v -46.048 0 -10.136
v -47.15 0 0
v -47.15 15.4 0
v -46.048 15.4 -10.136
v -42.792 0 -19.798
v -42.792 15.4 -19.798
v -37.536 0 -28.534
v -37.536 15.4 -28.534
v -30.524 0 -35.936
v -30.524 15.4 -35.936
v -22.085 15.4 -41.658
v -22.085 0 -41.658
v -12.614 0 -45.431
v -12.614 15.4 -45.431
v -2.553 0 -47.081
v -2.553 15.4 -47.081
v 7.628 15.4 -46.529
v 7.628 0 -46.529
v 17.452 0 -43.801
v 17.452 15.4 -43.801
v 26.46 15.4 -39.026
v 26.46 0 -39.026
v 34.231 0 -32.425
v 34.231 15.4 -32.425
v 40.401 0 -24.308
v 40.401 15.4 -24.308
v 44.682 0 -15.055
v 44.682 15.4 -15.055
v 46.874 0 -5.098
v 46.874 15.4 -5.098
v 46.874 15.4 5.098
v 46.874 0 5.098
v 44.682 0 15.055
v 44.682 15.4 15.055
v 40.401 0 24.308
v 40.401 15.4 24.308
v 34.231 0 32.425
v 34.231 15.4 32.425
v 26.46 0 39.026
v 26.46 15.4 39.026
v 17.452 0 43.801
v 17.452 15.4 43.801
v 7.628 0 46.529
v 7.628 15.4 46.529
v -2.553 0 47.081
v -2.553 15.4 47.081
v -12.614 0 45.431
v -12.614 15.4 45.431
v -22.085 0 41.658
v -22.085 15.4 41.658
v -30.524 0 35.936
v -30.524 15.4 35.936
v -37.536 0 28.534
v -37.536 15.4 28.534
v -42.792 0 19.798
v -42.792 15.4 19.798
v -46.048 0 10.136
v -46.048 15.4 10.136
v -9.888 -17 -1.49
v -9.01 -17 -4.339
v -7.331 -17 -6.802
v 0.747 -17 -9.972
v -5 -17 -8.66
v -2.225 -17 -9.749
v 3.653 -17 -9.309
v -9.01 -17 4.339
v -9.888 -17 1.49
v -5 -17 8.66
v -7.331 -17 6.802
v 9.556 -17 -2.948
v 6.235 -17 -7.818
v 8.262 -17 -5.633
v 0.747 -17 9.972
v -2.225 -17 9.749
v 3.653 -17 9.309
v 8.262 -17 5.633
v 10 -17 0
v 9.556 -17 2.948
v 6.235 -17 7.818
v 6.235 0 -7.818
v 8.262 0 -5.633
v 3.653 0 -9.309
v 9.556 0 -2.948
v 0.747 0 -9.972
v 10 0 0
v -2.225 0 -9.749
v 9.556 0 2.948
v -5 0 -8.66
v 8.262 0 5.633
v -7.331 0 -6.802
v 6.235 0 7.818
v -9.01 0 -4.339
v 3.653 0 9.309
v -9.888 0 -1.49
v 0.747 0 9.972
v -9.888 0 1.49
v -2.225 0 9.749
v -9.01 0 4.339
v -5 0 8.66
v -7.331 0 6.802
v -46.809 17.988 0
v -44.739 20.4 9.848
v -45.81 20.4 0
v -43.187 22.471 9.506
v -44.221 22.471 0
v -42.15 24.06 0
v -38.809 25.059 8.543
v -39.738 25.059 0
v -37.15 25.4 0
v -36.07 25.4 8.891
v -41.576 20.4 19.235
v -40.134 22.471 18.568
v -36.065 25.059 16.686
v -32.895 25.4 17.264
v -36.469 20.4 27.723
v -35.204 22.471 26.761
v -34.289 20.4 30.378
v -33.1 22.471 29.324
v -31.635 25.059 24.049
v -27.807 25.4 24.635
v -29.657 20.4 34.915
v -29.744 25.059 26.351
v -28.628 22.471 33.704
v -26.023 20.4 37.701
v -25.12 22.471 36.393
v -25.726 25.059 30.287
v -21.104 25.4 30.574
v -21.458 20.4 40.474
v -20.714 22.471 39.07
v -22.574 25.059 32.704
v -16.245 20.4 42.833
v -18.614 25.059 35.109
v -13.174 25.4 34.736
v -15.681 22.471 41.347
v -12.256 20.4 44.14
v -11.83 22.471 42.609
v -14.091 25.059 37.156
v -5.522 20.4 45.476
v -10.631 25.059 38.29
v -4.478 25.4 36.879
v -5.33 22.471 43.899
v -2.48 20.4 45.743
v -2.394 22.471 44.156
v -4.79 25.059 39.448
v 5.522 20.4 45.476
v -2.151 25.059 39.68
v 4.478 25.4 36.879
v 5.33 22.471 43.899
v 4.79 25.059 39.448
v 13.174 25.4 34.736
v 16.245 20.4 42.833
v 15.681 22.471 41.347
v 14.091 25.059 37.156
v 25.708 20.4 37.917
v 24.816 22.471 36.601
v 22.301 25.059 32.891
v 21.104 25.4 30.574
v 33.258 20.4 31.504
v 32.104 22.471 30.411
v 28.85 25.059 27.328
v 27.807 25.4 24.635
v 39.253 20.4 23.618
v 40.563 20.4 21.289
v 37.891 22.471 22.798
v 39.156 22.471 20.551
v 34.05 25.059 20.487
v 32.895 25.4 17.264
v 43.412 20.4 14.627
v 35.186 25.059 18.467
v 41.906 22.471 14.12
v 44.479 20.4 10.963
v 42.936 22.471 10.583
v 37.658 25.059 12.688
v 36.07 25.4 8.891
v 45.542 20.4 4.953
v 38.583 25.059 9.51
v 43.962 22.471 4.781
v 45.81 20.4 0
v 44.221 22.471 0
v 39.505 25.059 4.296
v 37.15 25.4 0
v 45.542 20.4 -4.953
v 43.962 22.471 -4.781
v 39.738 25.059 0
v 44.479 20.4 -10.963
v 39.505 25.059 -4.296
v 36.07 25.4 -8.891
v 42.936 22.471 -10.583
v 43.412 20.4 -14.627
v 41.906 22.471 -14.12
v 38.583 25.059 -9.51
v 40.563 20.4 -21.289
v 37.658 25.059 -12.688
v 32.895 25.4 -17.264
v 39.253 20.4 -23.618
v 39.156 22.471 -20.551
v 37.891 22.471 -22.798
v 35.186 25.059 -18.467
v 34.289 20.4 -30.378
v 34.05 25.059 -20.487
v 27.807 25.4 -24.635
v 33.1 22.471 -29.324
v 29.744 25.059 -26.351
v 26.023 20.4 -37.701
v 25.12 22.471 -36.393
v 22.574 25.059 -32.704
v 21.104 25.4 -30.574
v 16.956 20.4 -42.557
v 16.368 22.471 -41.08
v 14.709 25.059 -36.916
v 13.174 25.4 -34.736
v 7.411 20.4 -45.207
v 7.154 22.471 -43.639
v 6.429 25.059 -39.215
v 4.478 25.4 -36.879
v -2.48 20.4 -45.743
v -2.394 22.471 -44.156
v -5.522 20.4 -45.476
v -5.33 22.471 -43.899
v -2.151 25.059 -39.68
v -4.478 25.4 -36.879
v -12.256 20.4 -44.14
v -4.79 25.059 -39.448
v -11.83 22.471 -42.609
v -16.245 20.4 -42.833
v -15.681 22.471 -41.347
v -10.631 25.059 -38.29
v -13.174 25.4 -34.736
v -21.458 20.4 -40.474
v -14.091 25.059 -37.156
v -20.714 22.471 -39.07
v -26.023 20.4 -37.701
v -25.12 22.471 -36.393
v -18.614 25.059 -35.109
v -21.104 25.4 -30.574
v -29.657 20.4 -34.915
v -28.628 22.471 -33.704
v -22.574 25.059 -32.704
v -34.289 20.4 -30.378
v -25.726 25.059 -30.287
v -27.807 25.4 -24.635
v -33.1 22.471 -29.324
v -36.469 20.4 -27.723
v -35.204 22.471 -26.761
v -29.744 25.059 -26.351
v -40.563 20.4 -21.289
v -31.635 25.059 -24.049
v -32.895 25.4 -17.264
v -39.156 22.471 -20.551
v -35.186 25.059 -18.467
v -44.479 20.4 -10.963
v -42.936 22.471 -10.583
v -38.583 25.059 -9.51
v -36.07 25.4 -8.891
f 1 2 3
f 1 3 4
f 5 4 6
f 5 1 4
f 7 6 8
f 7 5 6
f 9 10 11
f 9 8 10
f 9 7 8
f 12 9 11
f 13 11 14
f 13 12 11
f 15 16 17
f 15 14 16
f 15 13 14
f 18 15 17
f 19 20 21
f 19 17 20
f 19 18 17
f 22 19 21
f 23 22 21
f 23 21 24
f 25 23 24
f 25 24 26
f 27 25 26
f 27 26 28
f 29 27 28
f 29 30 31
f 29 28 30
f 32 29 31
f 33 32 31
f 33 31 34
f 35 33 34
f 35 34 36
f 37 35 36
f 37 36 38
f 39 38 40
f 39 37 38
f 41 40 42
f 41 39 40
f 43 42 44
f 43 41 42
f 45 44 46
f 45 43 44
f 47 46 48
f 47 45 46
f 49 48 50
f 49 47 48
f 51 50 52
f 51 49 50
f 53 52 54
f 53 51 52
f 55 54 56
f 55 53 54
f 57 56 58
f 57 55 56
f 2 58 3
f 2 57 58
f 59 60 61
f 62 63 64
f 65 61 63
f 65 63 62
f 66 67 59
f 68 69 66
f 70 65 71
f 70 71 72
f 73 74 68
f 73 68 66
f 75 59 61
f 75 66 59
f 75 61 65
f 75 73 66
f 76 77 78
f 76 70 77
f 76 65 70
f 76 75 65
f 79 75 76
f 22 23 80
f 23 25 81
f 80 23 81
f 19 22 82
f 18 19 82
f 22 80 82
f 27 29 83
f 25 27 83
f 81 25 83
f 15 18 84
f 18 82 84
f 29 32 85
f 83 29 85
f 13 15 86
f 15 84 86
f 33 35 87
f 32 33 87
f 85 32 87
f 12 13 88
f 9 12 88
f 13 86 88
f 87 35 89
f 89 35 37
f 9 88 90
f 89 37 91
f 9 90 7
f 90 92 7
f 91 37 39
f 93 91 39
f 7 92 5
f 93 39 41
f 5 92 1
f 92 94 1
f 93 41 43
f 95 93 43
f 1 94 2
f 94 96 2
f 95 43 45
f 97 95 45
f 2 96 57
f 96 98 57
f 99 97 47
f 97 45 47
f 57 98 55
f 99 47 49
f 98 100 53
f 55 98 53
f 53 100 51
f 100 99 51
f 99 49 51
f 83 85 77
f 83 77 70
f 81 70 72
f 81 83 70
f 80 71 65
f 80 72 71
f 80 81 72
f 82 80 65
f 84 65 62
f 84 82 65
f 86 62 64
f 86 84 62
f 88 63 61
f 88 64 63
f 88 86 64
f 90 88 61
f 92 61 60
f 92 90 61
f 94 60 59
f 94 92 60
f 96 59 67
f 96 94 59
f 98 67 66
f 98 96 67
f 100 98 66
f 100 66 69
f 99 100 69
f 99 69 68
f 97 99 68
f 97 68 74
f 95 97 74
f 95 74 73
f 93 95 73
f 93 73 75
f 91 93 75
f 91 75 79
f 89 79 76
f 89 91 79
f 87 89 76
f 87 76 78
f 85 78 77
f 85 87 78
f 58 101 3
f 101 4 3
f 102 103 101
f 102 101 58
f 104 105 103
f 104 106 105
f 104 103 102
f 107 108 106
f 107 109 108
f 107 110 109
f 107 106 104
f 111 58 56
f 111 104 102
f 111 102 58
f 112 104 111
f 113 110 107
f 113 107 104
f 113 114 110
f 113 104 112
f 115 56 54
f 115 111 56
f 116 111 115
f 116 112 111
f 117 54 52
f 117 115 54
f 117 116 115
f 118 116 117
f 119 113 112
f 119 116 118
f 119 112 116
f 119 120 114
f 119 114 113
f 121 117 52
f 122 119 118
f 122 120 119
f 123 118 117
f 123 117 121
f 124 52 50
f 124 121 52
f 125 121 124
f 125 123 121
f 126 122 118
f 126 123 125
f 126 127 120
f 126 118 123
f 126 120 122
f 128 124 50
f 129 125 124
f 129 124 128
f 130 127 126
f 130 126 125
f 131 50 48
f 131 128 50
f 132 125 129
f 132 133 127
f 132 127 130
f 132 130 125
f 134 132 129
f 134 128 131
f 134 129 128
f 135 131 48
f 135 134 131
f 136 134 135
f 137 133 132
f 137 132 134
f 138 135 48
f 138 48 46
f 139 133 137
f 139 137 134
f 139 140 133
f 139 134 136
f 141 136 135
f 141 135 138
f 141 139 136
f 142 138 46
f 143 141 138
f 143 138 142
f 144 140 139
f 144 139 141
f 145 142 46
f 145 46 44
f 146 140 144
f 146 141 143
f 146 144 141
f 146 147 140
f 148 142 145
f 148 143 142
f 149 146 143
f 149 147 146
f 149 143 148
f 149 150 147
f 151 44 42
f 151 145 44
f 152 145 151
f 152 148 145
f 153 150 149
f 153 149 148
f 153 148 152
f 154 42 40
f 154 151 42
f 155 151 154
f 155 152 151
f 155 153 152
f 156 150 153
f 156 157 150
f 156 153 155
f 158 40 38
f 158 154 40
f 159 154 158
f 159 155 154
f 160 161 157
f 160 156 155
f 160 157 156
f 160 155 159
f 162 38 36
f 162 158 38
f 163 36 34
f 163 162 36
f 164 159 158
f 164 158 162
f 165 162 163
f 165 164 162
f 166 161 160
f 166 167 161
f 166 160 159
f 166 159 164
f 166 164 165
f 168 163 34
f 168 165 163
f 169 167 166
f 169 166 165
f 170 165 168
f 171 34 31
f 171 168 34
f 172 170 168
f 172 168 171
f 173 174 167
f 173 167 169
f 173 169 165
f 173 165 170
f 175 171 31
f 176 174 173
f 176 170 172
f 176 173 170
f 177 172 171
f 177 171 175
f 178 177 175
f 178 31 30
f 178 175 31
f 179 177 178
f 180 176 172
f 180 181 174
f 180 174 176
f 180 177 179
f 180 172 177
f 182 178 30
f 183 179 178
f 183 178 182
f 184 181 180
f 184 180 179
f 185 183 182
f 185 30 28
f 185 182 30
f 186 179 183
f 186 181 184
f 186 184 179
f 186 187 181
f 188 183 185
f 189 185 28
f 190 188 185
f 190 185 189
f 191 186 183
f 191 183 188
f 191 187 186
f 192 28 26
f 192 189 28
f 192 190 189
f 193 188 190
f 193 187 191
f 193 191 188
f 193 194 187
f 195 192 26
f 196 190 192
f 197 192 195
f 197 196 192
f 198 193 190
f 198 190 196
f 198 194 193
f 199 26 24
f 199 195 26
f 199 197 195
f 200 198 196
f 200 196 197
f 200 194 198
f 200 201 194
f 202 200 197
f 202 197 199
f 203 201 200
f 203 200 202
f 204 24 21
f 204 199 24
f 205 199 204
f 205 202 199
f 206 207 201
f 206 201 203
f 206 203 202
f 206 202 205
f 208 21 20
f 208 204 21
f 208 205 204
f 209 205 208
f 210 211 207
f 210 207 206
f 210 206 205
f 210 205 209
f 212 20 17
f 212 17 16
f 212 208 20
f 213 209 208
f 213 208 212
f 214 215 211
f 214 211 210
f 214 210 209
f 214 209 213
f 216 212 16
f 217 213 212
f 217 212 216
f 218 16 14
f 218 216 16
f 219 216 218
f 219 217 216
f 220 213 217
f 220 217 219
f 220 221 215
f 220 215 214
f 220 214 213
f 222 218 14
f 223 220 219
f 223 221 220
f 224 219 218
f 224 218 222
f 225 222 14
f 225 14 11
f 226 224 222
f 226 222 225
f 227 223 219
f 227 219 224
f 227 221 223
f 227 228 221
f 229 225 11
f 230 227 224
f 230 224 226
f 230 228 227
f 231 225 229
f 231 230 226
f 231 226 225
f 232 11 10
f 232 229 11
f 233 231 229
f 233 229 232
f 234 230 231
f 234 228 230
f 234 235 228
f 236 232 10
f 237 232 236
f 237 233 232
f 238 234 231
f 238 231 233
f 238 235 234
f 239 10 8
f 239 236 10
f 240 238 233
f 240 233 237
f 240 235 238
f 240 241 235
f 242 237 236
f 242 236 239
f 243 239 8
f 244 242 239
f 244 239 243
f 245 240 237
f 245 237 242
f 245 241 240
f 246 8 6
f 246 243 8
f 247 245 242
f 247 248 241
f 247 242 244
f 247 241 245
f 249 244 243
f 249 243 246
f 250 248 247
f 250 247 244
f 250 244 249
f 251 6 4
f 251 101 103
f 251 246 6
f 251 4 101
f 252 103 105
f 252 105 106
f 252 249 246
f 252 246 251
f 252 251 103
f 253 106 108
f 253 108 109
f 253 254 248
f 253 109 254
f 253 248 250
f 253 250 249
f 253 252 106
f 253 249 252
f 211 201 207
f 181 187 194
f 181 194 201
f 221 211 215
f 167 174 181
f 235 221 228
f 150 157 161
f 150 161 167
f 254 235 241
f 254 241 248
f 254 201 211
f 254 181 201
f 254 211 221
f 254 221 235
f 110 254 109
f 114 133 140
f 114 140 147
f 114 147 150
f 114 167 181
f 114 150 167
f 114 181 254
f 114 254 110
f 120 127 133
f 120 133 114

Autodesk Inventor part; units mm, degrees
ref_plane "YZ Plane" through (0, 0, 0) normal (1, 0, 0) x (0, 1, 0)
ref_plane "XZ Plane" through (0, 0, 0) normal (0, 1, 0) x (-1, 0, 0)
ref_plane "XY Plane" through (0, 0, 0) normal (0, 0, 1) x (1, 0, 0)
sketch "Sketch1" plane through (0, 0, 0) normal (0, 1, 0) x (-1, 0, 0)
  circle A0 centre (0, 0) radius 47.15
  dimension "d0" = 94.3
extrude "Extrusion1" add sketch "Sketch1" along normal blind 25.4
fillet "Fillet1" radius 10 1 edges at (47.15, 25.4, 0)
sketch "Sketch2" plane through (0, 0, 0) normal (0, -1, 0) x (1, 0, 0)
  circle A0 centre (0, 0) radius 10
  dimension "d4" = 20
extrude "Extrusion2" add sketch "Sketch2" along normal blind 17
thread "Thread1" size "M20x1.5" class "6g" standard "ANSI Metric M Profile" full length
properties part number "A.80.A.101111"
